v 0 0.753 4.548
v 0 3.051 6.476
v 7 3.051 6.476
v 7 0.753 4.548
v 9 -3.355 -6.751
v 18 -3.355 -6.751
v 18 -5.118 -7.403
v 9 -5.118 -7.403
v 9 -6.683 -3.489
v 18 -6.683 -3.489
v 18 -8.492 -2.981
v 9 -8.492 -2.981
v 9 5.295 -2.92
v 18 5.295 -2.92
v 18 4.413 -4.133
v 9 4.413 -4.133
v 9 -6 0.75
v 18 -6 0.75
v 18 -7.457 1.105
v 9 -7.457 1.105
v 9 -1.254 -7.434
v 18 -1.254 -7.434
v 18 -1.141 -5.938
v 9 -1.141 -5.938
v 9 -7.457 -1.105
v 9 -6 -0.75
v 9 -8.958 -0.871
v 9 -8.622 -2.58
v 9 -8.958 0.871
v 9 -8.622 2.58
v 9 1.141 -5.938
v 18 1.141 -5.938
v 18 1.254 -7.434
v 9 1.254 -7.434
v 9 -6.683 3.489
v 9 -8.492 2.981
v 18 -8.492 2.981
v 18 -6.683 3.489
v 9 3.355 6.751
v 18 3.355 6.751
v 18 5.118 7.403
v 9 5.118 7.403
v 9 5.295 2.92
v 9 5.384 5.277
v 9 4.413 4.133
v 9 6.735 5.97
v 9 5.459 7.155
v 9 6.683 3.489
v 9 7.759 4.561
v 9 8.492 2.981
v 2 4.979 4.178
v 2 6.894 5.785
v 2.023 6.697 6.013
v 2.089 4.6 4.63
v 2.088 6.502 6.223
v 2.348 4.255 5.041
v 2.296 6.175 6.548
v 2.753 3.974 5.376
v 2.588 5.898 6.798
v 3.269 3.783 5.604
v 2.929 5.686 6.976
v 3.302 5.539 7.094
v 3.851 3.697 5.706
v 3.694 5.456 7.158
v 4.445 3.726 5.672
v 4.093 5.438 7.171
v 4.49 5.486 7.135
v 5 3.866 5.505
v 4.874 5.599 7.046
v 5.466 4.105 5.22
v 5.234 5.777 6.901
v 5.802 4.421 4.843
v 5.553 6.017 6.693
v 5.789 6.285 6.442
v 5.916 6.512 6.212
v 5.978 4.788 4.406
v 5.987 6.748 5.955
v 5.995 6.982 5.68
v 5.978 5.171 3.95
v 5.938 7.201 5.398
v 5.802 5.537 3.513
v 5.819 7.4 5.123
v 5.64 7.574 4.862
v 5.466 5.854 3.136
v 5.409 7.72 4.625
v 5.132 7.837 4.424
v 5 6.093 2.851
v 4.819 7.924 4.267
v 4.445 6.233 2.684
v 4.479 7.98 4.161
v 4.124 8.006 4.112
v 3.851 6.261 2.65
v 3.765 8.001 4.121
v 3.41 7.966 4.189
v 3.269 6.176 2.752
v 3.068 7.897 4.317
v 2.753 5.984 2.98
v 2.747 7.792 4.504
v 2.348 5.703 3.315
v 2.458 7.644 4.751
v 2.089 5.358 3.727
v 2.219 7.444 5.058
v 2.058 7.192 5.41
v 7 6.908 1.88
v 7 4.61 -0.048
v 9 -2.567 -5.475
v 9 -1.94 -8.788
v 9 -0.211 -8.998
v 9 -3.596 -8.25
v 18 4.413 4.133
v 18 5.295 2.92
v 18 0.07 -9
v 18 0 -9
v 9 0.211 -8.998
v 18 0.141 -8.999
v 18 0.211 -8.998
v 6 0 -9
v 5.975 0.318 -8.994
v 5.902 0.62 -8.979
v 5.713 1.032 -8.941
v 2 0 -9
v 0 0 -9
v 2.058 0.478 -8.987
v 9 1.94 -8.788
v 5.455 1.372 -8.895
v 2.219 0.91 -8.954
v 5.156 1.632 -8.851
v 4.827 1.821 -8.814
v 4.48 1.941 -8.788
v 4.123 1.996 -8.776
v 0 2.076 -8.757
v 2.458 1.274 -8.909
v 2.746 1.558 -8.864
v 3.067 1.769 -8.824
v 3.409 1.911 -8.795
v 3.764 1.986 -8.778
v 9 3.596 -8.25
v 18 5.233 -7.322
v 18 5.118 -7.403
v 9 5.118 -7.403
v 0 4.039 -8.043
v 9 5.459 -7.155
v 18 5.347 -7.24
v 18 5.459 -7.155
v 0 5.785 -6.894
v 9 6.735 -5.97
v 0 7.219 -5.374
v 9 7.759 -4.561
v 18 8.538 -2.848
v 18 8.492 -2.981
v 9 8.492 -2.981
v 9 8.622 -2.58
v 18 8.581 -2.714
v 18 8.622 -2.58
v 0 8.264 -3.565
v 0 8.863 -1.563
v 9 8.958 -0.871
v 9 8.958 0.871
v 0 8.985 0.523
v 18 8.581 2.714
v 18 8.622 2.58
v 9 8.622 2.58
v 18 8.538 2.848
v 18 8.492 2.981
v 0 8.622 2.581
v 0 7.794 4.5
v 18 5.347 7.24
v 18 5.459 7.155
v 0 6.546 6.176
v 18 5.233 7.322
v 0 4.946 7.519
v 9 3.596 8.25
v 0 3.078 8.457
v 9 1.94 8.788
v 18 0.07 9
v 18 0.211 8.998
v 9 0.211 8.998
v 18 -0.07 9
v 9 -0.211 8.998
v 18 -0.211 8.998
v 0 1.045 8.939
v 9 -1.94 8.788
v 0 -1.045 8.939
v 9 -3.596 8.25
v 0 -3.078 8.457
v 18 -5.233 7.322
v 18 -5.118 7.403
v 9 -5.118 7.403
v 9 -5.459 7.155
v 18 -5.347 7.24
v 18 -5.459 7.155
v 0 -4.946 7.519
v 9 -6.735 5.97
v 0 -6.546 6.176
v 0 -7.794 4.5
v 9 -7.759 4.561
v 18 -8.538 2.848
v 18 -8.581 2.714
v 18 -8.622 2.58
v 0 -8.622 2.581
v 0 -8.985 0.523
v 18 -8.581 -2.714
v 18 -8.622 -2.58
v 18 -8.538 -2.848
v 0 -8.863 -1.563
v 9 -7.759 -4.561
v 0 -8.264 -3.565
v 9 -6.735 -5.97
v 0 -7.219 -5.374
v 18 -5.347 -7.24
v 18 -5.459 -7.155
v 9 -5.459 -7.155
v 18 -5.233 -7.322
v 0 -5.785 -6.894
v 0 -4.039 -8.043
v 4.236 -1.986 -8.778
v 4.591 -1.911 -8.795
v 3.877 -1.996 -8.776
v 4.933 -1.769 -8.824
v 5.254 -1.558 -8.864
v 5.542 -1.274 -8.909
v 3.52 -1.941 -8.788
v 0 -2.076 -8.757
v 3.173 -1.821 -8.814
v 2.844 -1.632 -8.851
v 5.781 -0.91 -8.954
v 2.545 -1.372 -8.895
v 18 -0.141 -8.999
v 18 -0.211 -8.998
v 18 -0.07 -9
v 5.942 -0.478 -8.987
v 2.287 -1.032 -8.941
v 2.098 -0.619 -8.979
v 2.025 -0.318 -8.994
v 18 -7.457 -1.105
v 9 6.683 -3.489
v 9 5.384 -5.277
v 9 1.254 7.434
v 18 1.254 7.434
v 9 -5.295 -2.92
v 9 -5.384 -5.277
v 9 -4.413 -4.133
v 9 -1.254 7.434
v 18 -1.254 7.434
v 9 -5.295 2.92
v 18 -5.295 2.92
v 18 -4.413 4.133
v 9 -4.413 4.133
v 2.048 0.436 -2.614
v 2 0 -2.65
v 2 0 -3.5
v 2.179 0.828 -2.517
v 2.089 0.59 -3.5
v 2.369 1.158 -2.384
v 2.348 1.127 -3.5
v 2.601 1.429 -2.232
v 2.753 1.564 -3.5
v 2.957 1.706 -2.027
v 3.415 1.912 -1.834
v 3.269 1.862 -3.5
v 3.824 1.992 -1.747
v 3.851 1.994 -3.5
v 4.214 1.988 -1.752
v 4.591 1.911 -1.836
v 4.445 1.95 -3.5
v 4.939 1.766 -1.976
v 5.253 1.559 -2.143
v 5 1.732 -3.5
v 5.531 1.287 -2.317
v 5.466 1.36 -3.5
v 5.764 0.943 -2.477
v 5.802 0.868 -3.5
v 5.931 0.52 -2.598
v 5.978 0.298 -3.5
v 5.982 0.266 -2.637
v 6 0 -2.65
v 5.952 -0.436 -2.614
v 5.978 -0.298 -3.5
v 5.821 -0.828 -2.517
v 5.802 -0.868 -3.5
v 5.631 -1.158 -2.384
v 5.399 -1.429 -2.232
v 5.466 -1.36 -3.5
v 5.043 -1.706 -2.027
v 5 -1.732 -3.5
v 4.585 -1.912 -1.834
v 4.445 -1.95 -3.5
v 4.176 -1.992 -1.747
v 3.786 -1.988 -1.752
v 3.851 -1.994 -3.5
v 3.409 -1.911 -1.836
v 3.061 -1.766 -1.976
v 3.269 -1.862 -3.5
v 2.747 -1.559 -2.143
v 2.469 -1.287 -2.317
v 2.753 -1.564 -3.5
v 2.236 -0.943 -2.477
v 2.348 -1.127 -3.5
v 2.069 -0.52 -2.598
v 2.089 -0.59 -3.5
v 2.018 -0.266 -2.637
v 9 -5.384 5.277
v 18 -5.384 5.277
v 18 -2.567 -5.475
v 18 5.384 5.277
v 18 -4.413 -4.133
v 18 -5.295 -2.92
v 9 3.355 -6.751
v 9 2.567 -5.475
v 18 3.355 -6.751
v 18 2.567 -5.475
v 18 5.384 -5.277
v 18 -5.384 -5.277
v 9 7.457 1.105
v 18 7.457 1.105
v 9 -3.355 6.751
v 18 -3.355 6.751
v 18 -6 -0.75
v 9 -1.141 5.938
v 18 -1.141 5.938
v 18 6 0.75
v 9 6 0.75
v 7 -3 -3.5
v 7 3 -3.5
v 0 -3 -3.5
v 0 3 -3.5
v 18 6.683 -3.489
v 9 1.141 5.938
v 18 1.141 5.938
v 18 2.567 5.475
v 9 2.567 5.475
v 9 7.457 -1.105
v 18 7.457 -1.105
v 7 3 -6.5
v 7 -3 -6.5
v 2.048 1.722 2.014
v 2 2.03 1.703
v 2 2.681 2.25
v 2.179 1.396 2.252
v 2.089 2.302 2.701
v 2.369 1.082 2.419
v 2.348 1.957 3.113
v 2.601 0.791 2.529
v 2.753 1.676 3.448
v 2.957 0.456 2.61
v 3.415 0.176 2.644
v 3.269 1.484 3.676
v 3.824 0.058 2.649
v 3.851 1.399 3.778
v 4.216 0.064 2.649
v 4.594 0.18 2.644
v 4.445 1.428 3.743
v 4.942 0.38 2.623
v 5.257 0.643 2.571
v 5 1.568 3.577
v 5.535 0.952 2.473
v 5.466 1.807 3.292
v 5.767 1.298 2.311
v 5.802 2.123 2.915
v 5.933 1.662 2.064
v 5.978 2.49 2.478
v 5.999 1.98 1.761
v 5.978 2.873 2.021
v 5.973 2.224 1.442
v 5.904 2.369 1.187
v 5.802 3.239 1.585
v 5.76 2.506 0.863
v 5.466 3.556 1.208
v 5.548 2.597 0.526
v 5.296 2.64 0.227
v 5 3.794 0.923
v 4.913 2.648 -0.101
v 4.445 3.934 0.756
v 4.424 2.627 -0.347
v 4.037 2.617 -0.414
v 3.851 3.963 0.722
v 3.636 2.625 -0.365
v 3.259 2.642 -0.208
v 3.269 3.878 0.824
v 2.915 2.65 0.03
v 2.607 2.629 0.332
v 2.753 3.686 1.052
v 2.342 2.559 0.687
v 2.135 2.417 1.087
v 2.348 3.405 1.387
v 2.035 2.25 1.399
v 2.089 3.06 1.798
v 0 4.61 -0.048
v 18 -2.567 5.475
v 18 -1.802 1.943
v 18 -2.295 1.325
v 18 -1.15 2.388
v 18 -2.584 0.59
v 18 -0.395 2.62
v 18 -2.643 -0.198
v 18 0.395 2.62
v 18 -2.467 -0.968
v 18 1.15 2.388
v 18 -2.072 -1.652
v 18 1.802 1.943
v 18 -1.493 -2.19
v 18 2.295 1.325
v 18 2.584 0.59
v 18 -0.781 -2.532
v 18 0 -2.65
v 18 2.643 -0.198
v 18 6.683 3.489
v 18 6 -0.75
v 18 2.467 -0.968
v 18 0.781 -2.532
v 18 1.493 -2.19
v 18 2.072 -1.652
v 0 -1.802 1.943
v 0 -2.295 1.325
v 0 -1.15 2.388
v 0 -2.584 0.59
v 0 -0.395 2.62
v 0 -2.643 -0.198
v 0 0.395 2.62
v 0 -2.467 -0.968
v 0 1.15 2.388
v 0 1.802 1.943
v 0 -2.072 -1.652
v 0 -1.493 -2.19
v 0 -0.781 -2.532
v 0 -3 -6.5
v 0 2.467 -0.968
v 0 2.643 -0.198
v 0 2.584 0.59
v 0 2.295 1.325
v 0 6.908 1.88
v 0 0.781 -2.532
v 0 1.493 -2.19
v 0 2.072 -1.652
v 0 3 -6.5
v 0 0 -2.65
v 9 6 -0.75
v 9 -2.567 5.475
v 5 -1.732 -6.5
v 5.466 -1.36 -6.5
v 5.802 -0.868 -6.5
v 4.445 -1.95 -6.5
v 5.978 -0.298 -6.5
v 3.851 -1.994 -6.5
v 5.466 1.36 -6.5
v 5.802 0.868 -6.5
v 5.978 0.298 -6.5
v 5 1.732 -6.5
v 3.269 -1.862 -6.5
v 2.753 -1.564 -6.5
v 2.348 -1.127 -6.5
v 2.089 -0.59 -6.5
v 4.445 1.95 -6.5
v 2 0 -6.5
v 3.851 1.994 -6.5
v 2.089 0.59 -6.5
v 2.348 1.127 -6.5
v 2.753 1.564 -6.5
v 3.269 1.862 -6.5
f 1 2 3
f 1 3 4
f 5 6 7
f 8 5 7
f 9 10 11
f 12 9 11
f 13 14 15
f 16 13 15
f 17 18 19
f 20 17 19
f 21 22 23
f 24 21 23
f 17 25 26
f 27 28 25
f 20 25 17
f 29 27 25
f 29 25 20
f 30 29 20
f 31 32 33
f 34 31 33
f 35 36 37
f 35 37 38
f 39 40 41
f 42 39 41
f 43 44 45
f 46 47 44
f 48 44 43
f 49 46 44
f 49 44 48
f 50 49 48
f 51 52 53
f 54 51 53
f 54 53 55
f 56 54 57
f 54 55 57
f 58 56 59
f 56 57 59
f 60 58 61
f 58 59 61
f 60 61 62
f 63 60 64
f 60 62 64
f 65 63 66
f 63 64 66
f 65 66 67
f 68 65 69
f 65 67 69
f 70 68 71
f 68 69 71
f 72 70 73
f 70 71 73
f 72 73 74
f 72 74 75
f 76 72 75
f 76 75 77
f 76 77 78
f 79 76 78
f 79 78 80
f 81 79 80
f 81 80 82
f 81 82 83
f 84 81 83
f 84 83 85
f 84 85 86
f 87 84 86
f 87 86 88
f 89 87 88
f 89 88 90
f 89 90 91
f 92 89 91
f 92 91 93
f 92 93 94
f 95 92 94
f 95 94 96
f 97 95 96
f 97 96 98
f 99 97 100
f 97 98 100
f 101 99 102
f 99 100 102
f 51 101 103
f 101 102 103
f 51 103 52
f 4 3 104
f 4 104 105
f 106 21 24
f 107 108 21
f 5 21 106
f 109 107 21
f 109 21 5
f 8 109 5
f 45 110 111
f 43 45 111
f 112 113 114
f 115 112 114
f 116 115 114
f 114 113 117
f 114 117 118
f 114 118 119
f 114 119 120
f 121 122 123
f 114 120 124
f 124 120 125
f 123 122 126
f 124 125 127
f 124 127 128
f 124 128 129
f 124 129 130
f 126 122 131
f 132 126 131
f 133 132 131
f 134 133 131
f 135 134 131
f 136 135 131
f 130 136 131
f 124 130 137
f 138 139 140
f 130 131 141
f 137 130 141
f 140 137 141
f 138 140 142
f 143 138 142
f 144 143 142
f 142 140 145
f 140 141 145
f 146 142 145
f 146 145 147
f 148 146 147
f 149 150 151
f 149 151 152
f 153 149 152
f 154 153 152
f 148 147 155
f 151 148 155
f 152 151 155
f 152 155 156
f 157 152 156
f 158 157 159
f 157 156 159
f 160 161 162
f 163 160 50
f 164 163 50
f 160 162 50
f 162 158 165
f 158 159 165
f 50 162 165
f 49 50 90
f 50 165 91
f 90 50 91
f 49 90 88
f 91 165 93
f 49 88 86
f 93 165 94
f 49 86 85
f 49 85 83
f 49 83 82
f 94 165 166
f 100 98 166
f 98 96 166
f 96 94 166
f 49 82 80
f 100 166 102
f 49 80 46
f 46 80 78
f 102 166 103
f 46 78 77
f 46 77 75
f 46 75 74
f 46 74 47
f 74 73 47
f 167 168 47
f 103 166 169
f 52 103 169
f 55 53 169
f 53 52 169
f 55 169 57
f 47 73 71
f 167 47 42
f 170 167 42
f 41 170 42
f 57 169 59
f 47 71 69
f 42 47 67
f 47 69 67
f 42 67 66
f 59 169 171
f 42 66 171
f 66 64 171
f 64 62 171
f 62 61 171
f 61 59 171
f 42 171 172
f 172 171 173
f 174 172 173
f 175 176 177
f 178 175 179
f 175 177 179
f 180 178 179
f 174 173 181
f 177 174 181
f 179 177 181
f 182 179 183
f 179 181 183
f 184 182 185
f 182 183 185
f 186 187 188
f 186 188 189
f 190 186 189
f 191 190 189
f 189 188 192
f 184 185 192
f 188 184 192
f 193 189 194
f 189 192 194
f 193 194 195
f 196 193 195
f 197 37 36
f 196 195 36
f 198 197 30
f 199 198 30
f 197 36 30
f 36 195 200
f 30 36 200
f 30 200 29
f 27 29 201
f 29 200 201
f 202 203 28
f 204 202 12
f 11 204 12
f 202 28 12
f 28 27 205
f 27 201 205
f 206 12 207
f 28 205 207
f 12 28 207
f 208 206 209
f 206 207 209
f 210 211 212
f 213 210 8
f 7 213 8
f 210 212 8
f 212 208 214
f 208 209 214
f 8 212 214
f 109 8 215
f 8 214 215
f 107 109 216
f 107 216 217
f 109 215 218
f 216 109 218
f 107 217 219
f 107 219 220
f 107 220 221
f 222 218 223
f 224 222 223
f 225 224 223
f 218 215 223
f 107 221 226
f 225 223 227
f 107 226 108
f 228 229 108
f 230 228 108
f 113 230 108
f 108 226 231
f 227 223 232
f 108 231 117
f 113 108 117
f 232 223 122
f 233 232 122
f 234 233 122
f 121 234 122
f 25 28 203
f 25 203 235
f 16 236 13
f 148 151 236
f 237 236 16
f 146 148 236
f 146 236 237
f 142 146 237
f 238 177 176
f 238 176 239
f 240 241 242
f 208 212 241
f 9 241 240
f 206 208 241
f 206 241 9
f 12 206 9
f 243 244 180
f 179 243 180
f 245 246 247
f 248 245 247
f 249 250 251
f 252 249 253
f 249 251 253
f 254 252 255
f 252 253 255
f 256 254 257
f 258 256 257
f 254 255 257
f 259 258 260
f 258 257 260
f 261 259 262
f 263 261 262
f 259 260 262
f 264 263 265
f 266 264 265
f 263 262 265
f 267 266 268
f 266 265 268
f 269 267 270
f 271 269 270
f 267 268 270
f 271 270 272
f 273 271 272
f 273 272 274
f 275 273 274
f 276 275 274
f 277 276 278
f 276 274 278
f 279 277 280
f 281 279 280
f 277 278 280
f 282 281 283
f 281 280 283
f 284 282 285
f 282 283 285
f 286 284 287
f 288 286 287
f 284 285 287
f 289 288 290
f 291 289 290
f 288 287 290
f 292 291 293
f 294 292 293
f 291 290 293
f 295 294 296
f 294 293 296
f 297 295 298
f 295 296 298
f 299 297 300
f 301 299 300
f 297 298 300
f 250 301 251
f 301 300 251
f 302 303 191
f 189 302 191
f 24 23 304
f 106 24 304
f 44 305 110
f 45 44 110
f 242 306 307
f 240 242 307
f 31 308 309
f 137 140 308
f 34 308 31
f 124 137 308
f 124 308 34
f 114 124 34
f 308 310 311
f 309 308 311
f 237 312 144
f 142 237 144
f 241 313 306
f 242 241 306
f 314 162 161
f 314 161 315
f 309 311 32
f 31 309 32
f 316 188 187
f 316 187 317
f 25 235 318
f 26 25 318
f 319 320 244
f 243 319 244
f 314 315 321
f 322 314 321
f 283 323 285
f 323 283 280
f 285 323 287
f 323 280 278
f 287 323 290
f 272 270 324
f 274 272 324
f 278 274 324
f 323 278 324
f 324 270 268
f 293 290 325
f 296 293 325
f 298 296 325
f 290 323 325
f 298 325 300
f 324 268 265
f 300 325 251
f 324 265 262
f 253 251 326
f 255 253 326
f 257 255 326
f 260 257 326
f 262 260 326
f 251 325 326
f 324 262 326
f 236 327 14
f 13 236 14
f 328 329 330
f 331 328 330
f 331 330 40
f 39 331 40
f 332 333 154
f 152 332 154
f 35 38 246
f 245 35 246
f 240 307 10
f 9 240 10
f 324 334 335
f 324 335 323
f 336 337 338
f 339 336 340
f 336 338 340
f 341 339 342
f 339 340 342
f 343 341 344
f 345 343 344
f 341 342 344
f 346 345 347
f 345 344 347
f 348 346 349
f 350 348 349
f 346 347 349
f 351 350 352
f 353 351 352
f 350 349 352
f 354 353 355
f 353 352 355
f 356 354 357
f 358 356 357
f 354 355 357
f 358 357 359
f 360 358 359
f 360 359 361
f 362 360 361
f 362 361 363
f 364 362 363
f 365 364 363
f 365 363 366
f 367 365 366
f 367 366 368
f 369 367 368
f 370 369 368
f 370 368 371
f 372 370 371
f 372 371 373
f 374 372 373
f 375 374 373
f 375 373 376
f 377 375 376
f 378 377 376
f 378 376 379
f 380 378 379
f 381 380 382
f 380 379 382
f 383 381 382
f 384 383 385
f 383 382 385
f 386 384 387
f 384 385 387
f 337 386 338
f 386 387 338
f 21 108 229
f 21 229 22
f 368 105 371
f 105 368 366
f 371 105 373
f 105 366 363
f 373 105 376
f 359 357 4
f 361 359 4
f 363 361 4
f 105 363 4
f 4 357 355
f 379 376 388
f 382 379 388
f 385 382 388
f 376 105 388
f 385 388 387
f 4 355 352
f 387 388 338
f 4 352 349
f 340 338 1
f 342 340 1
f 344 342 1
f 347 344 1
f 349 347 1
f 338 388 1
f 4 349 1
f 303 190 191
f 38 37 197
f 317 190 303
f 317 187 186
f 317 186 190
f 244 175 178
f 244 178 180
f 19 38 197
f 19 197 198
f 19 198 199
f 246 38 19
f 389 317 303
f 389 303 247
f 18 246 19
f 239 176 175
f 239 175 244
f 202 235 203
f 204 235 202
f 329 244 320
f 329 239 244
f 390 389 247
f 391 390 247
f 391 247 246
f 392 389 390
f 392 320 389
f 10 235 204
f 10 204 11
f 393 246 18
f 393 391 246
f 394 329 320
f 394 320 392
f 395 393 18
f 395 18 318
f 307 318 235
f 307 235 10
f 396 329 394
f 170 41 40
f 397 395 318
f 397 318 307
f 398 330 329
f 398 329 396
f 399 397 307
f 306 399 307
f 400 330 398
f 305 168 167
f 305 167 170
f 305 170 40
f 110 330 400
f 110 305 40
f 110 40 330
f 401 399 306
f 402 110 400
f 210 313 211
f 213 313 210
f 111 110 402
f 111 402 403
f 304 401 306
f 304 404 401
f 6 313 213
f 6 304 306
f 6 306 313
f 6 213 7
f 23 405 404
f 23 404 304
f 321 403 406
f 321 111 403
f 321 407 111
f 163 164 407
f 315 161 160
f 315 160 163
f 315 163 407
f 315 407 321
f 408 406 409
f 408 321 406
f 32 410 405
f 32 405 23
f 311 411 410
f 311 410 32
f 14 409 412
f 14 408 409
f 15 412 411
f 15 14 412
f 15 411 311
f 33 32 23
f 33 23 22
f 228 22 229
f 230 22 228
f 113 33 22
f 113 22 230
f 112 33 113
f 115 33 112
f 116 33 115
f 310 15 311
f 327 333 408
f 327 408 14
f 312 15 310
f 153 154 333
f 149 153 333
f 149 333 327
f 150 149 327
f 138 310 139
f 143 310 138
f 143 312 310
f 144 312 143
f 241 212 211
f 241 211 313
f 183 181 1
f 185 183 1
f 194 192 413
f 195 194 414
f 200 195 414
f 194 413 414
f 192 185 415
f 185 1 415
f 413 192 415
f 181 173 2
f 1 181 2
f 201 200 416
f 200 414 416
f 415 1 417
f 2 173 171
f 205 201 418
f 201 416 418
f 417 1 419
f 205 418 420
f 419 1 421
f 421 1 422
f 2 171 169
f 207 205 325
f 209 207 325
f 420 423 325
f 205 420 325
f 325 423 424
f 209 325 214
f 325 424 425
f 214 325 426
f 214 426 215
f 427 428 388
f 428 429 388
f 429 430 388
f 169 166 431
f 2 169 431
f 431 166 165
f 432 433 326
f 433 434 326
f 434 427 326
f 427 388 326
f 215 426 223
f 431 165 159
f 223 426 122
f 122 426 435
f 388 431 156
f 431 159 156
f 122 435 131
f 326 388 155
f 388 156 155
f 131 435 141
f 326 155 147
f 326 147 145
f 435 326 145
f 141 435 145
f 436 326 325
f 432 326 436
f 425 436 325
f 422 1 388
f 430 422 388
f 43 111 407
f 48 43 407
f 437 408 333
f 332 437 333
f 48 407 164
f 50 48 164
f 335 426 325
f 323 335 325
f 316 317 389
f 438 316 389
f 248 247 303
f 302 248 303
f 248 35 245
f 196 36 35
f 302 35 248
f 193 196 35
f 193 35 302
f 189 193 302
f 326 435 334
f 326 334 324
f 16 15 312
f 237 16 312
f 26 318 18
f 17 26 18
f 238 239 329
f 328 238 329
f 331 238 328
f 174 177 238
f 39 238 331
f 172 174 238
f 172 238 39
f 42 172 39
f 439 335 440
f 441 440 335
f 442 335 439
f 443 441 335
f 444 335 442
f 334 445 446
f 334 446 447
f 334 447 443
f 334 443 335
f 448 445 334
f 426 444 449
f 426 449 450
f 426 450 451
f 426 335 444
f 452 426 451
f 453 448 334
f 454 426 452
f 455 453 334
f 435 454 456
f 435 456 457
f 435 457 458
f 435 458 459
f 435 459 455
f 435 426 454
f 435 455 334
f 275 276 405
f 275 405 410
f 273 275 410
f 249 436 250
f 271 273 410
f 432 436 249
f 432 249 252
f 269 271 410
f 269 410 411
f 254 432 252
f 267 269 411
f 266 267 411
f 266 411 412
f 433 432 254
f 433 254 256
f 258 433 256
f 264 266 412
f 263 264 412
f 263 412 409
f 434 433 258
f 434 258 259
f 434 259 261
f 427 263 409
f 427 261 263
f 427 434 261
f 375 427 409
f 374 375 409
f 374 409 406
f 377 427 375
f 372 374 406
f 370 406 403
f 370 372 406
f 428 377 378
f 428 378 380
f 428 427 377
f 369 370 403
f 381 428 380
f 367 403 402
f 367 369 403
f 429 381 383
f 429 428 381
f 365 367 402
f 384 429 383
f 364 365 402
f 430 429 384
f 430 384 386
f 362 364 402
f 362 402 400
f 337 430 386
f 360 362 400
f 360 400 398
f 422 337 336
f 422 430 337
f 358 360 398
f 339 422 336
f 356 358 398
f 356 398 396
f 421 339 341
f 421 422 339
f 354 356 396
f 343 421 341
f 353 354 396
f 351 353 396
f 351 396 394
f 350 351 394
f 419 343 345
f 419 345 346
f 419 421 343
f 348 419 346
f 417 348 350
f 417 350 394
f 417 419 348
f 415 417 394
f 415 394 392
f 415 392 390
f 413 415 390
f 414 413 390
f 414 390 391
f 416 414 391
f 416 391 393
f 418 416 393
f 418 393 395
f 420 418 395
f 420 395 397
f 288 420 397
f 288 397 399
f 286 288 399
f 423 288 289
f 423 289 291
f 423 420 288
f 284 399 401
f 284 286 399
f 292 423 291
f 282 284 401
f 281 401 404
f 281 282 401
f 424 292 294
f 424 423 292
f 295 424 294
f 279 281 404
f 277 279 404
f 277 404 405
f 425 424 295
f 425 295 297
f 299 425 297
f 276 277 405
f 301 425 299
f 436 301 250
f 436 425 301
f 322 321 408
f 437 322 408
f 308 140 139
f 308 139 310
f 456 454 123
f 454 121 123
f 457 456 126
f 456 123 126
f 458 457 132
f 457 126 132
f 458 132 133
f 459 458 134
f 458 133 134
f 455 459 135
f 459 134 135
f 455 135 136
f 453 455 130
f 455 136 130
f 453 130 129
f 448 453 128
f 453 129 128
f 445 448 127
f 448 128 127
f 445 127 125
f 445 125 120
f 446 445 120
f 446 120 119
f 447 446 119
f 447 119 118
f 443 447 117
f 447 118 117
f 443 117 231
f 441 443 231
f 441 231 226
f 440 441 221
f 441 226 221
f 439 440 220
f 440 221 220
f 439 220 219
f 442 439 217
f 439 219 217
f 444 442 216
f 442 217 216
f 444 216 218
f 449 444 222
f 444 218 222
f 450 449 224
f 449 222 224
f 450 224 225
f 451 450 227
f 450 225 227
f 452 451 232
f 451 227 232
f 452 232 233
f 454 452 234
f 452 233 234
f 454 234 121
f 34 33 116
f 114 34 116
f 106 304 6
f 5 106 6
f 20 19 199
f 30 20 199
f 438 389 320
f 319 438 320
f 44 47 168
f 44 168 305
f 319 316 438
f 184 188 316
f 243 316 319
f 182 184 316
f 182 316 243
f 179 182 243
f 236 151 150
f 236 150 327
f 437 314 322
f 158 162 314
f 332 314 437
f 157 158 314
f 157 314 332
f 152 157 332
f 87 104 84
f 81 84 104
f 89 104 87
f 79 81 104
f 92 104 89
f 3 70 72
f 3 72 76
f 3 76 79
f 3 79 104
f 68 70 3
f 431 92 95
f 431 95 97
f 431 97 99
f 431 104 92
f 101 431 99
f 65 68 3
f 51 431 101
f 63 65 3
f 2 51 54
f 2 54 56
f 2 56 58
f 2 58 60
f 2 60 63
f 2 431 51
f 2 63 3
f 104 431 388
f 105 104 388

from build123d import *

# Parameters (mm, degrees)
ESQUISSE1_R                  = 9
ESQUISSE1_R_2                = 2.65
BOSS_EXTRU_1_DEPTH           = 18
ENL_V_MAT_EXTRU_2_DEPTH      = 9
R_P_TITION_CIRCULAIRE1_COUNT = 10
ESQUISSE6_W                  = 3
ESQUISSE6_H                  = 6
ENL_V_MAT_EXTRU_3_DEPTH      = 7
ESQUISSE7_R                  = 2
ENL_V_MAT_EXTRU_4_DEPTH      = 9
R_P_TITION_CIRCULAIRE2_COUNT = 2
R_P_TITION_CIRCULAIRE2_ANGLE = 130


with BuildPart() as part:
    # Esquisse1 → Boss.-Extru.1 (new body)
    with BuildSketch(Plane(origin=(0, 0, 0), x_dir=(0, 0, -1), z_dir=(1, 0, 0))):
        Circle(ESQUISSE1_R)
        Circle(ESQUISSE1_R_2, mode=Mode.SUBTRACT)
    extrude(amount=BOSS_EXTRU_1_DEPTH)

    # Esquisse5 → Enlèv. mat.-Extru.2 (cut)
    with BuildSketch(Plane(origin=(18, 0, 0), x_dir=(0, 0, -1), z_dir=(1, 0, 0))):
        with BuildLine():
            Line((-0.75, 6), (0.75, 6))
            Line((0.75, 6), (1.105, 7.457386359))
            Line((1.105, 7.457386359), (2.579613997, 8.622388974))
            ThreePointArc((2.579613997, 8.622388974), (0, 9), (-2.579613997, 8.622388974))
            Line((-2.579613997, 8.622388974), (-1.105, 7.457386359))
            Line((-1.105, 7.457386359), (-0.75, 6))
        make_face()
    enl_v_mat_extru_2 = extrude(amount=-ENL_V_MAT_EXTRU_2_DEPTH, mode=Mode.SUBTRACT)

    # Répétition circulaire1: Enlèv. mat.-Extru.2 ×10 about axis
    r_p_tition_circulaire1_axis = Axis((0, 0, 0), (1, 0, 0))
    for i in range(1, R_P_TITION_CIRCULAIRE1_COUNT):
        add(enl_v_mat_extru_2.rotate(r_p_tition_circulaire1_axis, i * 360 / R_P_TITION_CIRCULAIRE1_COUNT), mode=Mode.SUBTRACT)

    # Esquisse6 → Enlèv. mat.-Extru.3 (cut)
    with BuildSketch(Plane.ZY):
        with Locations((-5, 0)):
            Rectangle(ESQUISSE6_W, ESQUISSE6_H)
    enl_v_mat_extru_3 = extrude(amount=-ENL_V_MAT_EXTRU_3_DEPTH, mode=Mode.SUBTRACT)

    # Esquisse7 → Enlèv. mat.-Extru.4 (cut)
    with BuildSketch(Plane(origin=(0, 0, -9), x_dir=(-1, 0, 0), z_dir=(0, 0, -1))):
        with Locations((-4, 0)):
            Circle(ESQUISSE7_R)
    enl_v_mat_extru_4 = extrude(amount=-ENL_V_MAT_EXTRU_4_DEPTH, mode=Mode.SUBTRACT)

    # Répétition circulaire2: Enlèv. mat.-Extru.3, Enlèv. mat.-Extru.4 ×2 about axis
    r_p_tition_circulaire2_axis = Axis((0, 0, 0), (1, 0, 0))
    for i in range(1, R_P_TITION_CIRCULAIRE2_COUNT):
        add(enl_v_mat_extru_3.rotate(r_p_tition_circulaire2_axis, i * R_P_TITION_CIRCULAIRE2_ANGLE / (R_P_TITION_CIRCULAIRE2_COUNT - 1)), mode=Mode.SUBTRACT)
        add(enl_v_mat_extru_4.rotate(r_p_tition_circulaire2_axis, i * R_P_TITION_CIRCULAIRE2_ANGLE / (R_P_TITION_CIRCULAIRE2_COUNT - 1)), mode=Mode.SUBTRACT)


solid = part.part
